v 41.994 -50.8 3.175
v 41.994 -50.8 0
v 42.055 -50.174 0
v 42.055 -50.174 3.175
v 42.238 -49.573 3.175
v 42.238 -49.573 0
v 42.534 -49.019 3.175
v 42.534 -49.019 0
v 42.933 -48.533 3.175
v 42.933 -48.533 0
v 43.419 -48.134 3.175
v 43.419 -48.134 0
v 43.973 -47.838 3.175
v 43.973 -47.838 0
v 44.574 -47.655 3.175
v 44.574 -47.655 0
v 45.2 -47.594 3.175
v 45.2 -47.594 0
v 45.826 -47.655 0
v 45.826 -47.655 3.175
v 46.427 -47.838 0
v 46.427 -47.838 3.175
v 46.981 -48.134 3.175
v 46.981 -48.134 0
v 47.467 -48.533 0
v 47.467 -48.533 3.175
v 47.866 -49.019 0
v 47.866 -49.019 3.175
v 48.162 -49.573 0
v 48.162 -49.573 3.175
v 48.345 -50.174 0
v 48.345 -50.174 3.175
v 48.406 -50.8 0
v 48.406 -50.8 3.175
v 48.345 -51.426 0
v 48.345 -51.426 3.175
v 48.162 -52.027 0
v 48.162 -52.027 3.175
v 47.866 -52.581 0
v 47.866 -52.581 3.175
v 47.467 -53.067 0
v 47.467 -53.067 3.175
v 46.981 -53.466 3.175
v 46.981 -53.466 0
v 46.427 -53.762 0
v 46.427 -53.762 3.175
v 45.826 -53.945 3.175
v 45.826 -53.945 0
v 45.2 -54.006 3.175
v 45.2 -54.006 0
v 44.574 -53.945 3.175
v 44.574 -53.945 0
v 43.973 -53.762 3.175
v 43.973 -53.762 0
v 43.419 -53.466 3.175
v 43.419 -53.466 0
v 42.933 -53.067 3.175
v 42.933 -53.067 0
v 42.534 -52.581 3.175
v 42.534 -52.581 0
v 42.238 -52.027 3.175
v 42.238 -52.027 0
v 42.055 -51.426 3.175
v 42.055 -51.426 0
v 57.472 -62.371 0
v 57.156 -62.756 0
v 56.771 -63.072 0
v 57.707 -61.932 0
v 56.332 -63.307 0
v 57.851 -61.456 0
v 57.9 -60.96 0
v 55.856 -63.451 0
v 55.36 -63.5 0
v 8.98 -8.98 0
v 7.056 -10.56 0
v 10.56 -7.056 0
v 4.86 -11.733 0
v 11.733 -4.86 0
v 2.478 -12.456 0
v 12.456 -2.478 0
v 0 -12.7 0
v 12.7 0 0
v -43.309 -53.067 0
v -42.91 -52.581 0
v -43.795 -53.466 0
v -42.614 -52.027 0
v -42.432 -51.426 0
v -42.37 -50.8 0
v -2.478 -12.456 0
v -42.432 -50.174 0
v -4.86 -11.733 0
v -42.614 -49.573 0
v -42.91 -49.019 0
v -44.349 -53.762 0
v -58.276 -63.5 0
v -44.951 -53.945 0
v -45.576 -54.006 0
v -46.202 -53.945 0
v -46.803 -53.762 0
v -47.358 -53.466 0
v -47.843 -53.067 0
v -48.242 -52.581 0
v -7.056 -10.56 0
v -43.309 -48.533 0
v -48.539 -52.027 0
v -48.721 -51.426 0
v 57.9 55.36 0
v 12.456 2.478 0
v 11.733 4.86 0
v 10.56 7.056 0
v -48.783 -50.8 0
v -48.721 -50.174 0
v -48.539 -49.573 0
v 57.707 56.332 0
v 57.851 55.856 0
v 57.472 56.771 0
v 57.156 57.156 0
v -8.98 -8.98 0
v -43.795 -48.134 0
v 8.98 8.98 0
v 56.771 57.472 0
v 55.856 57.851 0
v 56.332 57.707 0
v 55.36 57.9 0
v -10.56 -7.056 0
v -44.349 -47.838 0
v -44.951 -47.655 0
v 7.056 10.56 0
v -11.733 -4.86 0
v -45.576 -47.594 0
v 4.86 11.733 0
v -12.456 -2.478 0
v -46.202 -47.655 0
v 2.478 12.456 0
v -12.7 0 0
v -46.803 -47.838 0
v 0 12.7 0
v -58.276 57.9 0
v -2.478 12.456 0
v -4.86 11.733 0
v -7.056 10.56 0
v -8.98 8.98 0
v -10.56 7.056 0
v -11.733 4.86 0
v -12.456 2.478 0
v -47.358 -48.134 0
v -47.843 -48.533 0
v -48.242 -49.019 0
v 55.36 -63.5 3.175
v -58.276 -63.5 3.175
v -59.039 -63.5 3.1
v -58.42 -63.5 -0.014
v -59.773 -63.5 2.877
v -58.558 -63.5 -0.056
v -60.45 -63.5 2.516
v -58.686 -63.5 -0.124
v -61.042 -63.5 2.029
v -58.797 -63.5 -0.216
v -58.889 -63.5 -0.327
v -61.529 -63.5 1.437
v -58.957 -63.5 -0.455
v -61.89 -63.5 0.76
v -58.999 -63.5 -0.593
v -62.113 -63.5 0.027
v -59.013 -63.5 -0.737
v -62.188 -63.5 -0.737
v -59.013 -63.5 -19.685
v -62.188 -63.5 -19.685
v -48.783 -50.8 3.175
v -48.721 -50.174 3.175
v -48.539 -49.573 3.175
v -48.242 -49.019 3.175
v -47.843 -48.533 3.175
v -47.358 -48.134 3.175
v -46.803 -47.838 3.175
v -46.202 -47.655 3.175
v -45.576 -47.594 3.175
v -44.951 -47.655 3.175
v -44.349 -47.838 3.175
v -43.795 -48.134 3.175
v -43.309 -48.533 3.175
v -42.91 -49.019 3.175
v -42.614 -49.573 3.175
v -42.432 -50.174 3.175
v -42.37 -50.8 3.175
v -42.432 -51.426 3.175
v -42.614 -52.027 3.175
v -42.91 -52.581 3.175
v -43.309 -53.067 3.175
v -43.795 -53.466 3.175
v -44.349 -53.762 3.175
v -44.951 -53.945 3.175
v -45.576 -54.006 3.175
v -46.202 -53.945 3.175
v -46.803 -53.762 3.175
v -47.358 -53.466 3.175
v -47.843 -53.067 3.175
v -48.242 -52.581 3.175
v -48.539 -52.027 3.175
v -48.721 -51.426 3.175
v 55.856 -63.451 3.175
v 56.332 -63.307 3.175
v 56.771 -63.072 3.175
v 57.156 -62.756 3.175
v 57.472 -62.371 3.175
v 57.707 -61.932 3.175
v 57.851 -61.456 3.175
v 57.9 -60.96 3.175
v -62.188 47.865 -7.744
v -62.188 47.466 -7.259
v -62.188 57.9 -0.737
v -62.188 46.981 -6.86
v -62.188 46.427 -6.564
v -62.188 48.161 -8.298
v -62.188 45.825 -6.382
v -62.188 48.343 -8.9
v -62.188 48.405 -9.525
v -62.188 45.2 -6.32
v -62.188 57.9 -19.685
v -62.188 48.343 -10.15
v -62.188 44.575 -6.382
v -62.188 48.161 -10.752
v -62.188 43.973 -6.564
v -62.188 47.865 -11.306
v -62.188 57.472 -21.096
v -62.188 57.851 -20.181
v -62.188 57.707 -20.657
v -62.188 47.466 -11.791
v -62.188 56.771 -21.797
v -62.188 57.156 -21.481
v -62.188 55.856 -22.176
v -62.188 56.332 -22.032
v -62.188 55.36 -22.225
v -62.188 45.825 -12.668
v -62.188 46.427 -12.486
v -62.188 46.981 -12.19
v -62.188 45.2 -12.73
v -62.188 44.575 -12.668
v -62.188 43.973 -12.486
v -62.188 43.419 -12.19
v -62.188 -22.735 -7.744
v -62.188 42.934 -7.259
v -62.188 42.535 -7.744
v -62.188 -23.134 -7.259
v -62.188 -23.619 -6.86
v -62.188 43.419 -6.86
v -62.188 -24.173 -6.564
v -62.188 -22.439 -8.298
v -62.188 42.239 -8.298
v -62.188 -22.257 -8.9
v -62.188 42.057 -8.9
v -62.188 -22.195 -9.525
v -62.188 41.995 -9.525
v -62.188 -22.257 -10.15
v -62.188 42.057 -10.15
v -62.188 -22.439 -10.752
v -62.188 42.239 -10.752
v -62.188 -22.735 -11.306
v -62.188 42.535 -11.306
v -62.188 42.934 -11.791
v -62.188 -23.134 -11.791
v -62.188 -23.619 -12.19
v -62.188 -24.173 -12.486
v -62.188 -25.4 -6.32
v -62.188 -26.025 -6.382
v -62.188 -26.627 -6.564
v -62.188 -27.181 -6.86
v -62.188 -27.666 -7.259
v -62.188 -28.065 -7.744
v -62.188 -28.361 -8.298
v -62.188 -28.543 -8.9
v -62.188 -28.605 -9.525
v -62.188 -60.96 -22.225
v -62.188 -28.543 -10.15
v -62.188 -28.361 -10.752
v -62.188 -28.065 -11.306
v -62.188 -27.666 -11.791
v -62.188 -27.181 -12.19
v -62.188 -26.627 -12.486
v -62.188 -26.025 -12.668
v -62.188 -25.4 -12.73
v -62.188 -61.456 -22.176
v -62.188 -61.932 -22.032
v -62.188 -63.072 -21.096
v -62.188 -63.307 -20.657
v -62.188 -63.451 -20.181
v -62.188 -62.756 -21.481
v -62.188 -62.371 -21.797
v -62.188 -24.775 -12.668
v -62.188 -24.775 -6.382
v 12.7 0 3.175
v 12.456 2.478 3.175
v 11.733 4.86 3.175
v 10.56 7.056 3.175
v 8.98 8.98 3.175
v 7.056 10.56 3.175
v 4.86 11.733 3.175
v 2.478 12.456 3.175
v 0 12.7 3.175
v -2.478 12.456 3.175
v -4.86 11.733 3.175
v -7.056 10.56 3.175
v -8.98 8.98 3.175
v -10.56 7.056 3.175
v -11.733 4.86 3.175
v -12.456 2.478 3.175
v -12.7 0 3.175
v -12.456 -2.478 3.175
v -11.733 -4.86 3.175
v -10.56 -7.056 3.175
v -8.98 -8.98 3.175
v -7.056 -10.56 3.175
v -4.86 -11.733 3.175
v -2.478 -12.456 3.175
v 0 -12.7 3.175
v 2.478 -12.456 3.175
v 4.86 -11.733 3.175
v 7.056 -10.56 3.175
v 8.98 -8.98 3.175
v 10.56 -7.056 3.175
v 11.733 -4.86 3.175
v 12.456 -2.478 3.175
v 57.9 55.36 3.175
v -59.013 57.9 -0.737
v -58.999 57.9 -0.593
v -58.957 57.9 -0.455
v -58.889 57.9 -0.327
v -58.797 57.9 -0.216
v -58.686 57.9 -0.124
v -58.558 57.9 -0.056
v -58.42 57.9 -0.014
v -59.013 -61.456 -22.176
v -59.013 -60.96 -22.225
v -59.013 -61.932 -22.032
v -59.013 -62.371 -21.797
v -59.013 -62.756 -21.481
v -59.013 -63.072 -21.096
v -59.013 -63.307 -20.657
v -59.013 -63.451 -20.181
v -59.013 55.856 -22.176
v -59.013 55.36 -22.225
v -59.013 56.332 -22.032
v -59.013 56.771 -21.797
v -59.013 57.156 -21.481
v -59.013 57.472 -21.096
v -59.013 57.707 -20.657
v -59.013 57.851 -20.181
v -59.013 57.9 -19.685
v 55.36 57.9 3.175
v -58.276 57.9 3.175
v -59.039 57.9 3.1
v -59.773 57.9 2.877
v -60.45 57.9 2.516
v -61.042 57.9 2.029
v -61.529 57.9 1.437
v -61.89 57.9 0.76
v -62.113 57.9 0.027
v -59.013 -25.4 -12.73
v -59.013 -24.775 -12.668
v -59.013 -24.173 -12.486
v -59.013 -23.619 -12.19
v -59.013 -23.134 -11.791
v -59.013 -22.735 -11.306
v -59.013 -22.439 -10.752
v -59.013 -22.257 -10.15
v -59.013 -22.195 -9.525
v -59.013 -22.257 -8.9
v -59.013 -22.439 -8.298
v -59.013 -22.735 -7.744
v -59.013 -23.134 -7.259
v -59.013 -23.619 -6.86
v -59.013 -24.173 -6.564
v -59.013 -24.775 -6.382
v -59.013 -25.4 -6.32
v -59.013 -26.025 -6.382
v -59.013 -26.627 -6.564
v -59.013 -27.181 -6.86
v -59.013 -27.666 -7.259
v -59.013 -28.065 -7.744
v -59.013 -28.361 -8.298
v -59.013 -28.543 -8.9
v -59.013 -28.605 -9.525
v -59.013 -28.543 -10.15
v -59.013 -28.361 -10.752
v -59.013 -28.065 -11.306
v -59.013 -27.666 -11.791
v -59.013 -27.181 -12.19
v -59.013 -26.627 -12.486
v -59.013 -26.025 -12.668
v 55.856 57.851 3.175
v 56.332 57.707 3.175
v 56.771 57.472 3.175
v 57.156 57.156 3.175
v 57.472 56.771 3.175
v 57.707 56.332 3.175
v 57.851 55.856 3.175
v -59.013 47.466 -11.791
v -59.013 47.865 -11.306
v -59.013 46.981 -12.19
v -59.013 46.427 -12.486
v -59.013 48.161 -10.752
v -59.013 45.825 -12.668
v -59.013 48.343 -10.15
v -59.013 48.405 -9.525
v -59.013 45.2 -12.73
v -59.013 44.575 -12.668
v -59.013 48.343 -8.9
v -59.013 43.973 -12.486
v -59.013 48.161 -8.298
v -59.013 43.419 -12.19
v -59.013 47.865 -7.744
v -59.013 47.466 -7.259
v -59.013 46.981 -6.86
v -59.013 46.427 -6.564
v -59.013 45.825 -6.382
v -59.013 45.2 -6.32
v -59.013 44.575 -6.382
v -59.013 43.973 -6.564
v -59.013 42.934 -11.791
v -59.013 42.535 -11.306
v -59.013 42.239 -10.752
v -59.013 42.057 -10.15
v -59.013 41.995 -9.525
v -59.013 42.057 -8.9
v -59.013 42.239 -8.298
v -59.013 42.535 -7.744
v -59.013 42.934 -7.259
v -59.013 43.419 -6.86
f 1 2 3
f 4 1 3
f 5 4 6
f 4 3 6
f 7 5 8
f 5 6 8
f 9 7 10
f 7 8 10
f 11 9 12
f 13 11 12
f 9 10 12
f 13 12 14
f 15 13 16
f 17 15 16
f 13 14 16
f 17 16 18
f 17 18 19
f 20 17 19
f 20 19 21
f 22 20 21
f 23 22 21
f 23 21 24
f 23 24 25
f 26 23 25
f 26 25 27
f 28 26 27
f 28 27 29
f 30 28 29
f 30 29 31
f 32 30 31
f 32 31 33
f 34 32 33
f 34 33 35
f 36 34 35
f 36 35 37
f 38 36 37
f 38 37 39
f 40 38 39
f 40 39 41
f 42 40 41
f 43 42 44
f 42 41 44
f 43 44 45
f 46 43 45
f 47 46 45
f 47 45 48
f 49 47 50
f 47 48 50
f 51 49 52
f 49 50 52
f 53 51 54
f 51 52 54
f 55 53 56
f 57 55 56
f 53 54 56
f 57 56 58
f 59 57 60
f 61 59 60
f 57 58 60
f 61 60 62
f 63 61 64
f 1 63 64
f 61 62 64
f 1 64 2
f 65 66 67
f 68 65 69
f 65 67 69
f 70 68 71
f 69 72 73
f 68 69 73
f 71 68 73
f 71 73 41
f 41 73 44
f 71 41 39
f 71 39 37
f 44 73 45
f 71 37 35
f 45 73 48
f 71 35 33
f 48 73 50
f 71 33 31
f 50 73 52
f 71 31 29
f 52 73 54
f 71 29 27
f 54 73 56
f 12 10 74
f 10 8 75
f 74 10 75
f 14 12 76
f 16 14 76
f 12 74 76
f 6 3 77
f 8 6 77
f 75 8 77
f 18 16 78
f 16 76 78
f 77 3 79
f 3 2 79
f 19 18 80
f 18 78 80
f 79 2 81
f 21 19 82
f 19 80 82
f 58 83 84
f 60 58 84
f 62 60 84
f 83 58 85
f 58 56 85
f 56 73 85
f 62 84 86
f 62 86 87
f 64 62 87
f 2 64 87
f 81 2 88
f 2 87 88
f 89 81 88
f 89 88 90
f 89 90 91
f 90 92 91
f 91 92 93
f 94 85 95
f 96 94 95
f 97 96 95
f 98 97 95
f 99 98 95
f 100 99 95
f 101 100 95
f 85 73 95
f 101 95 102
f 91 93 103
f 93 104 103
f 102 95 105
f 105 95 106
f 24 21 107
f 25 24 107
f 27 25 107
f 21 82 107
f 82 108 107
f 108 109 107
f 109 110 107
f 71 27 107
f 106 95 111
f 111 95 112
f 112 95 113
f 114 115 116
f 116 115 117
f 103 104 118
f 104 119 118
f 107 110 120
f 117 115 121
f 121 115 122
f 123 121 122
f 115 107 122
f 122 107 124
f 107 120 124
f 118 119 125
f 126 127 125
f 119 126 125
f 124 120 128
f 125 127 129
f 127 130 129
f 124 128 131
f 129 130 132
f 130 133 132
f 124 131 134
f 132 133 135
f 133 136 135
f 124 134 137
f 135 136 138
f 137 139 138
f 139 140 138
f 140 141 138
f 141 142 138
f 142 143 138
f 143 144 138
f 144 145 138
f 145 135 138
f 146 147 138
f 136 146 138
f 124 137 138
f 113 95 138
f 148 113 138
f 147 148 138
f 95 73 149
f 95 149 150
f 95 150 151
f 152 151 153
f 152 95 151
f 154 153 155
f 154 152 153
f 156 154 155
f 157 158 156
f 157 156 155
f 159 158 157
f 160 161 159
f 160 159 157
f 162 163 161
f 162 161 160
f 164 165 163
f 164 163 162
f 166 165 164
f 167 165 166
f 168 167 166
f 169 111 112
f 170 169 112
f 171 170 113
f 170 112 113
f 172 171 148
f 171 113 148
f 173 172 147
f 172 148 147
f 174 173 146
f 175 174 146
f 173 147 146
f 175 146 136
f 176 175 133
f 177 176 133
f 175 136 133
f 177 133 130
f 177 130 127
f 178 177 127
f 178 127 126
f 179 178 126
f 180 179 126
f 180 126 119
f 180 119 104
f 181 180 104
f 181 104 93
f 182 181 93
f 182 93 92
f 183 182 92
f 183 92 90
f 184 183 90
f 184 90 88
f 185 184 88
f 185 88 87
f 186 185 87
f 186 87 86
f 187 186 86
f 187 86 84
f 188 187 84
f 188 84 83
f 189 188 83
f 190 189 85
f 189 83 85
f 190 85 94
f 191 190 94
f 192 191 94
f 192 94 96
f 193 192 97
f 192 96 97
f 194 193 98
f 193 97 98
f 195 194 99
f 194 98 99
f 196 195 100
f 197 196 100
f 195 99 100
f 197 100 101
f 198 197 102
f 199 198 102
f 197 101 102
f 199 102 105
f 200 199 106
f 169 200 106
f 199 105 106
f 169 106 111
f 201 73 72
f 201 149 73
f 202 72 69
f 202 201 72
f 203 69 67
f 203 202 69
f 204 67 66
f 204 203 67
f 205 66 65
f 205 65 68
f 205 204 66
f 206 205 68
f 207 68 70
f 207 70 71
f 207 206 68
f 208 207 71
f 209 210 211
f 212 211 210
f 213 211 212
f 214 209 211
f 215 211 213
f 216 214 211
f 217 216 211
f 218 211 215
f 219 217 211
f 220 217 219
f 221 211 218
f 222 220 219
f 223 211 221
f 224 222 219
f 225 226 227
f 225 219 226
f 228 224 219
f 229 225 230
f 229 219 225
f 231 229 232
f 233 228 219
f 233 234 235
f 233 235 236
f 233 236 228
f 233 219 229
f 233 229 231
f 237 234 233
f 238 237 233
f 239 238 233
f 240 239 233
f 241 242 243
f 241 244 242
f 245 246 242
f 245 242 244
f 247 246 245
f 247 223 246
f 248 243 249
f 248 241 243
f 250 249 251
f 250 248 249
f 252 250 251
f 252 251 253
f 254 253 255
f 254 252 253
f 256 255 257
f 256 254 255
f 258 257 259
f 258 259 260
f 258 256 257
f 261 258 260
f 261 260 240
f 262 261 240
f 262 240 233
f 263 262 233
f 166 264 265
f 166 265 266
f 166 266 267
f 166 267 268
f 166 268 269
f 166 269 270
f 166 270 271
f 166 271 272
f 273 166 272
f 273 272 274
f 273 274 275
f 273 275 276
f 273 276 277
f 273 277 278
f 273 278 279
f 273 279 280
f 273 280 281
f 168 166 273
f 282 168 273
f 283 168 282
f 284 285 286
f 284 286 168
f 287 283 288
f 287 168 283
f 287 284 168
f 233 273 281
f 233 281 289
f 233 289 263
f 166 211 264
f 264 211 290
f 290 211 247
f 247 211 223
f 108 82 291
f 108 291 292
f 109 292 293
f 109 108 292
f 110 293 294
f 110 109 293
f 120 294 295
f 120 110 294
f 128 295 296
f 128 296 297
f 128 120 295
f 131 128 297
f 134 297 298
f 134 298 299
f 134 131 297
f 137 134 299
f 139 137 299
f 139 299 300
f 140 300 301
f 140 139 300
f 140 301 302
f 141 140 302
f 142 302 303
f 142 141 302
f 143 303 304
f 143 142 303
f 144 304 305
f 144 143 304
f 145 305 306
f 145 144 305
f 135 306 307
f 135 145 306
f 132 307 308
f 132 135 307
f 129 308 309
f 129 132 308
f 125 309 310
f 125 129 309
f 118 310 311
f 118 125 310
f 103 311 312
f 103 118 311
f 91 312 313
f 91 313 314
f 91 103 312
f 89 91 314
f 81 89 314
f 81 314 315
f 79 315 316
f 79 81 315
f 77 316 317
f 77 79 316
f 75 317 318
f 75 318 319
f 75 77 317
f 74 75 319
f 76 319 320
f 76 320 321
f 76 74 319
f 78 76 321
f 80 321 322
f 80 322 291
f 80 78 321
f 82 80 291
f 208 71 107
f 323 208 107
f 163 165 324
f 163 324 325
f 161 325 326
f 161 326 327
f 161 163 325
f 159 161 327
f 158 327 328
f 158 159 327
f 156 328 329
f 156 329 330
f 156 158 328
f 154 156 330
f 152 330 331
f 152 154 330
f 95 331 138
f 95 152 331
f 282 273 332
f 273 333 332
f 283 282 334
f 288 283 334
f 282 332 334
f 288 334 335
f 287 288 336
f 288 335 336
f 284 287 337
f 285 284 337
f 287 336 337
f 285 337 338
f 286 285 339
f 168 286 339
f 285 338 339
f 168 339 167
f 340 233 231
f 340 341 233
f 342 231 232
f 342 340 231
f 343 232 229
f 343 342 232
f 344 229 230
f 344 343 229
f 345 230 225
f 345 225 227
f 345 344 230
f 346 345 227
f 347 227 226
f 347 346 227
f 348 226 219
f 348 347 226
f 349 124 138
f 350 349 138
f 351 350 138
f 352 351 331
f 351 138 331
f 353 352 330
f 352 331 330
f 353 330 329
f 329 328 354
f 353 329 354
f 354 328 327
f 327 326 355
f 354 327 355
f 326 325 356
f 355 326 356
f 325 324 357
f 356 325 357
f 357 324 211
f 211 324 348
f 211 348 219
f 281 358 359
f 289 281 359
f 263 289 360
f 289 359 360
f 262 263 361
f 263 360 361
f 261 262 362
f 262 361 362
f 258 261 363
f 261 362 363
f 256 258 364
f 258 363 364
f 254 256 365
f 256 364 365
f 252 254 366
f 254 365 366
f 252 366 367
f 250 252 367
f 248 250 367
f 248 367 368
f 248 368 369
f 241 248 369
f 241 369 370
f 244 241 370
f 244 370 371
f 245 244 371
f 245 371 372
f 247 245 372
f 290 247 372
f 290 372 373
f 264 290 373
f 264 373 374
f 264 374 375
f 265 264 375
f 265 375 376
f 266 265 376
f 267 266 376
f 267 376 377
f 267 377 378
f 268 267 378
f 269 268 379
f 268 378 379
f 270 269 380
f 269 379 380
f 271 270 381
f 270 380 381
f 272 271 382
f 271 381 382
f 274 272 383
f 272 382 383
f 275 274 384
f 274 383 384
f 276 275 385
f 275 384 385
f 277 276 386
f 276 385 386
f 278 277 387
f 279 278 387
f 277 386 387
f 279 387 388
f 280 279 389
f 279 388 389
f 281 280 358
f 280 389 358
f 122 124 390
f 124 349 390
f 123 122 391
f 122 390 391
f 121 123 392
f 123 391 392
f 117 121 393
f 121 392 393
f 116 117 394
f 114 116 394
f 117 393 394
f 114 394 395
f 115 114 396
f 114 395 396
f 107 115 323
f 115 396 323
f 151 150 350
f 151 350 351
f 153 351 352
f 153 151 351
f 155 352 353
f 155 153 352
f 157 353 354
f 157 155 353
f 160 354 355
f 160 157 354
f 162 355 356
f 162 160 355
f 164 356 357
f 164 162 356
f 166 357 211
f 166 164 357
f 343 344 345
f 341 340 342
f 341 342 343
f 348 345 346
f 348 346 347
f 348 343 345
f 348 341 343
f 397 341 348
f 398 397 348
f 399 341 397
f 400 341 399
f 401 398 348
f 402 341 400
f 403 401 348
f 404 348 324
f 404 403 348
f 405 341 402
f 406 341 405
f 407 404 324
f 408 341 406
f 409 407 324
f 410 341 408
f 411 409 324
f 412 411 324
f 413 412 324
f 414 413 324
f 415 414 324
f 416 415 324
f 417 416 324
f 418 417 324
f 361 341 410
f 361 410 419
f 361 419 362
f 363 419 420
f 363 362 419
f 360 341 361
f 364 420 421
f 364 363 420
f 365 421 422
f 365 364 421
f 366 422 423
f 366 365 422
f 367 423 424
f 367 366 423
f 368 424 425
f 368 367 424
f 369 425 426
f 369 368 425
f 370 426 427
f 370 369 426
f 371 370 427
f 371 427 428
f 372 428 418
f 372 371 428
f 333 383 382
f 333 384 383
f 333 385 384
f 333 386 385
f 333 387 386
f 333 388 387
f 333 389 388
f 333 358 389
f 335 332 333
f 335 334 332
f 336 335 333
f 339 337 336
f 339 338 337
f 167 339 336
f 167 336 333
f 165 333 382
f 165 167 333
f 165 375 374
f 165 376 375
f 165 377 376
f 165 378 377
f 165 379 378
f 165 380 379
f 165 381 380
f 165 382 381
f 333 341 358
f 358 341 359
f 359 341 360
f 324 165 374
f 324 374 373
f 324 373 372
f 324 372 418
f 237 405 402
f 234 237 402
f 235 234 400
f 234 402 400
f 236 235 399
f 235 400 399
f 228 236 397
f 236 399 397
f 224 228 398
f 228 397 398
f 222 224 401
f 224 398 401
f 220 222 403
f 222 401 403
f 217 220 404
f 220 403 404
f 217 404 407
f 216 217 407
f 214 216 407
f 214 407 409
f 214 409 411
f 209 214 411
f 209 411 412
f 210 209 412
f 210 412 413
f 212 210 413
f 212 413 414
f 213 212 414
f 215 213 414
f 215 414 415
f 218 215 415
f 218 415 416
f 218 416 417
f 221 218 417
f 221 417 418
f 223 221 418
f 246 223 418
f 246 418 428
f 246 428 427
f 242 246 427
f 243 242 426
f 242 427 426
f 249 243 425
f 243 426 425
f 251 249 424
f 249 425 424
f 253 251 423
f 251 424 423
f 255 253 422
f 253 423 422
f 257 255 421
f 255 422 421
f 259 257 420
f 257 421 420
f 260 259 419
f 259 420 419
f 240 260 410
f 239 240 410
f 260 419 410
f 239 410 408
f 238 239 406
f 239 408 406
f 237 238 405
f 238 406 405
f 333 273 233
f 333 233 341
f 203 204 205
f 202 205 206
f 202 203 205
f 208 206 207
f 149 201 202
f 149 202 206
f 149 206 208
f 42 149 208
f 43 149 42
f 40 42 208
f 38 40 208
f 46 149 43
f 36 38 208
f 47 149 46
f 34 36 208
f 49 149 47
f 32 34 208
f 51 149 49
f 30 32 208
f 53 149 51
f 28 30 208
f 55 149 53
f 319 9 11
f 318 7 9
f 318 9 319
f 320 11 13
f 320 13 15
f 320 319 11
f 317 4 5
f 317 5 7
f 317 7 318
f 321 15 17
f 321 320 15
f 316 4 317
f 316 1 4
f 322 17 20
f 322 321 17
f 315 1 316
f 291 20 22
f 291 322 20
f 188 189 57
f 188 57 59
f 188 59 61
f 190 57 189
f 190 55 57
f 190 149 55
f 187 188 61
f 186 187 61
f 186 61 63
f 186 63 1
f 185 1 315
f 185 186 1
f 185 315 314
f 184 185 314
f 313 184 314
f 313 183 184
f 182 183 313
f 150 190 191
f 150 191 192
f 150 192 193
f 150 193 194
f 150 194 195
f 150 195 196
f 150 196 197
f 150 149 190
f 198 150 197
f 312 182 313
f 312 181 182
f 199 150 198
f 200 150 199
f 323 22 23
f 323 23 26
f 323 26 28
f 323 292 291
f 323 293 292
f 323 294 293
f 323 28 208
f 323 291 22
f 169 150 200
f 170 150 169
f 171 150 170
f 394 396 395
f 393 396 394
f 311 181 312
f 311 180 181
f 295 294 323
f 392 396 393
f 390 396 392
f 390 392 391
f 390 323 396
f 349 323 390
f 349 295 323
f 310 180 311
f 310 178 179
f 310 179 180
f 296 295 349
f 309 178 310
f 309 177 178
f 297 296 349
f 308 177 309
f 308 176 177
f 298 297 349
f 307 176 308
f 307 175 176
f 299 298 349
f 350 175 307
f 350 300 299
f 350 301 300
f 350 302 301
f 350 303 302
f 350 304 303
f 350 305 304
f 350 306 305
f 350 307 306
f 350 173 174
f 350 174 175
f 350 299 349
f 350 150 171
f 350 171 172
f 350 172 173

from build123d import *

# Parameters (mm, degrees)
SKETCH1_W                    = 121.4
SKETCH1_H                    = 120.087935058
SKETCH1_R                    = 12.7
BASE_FLANGE1_DEPTH           = 3.175
EDGE_FLANGE1_STRIP_W         = 14.1732
EDGE_FLANGE1_STRIP_H         = 3.175
EDGE_FLANGE1_STRIP_CUT_DEPTH = 121.4
EDGE_FLANGE1_DEPTH           = 121.4
FILLET1_R                    = 2.54
SKETCH9_R                    = 3.205
LOWER_T_SLOT_HOLES_DEPTH     = 135.888231543
SKETCH10_R                   = 3.206253706
UPPER_T_SLOT_HOLES_DEPTH     = 92.616264341


# Sheet-metal steps are written as plain solids
with BuildPart() as part:
    # Sketch1 → Base-Flange1 (new body)
    with BuildSketch(Plane(origin=(0, 0, 0), x_dir=(0, 1, 0), z_dir=(0, 0, 1))):
        with Locations((-2.8, 2.143967529)):
            Rectangle(SKETCH1_W, SKETCH1_H)
        with Locations(Location((0, 0, 0), (0, 0, 270))):
            Circle(SKETCH1_R, mode=Mode.SUBTRACT)
    extrude(amount=BASE_FLANGE1_DEPTH)

    # Edge-Flange1 strip (across the edge) → Edge-Flange1 strip cut (cut)
    with BuildSketch(Plane(origin=(-62.187935058, -63.5, 0), x_dir=(1, 0, 0), z_dir=(0, 1, 0))):
        with Locations((-3.175, -1.5875)):
            Rectangle(EDGE_FLANGE1_STRIP_W, EDGE_FLANGE1_STRIP_H)
    extrude(amount=EDGE_FLANGE1_STRIP_CUT_DEPTH, mode=Mode.SUBTRACT)

    # Edge-Flange1 section (across the edge) → Edge-Flange1 (add)
    with BuildSketch(Plane(origin=(-62.187935058, -63.5, 0), x_dir=(1, 0, 0), z_dir=(0, 1, 0))):
        with BuildLine():
            Line((0, 0.7366), (0, 22.225))
            Line((0, 22.225), (3.175, 22.225))
            Line((3.175, 22.225), (3.175, 0.7366))
            ThreePointArc((3.175, 0.7366), (3.390745145, 0.215745145), (3.9116, 0))
            Line((3.9116, 0), (3.9116, -3.175))
            ThreePointArc((3.9116, -3.175), (1.145681115, -2.029318885), (0, 0.7366))
        make_face()
    extrude(amount=EDGE_FLANGE1_DEPTH)

    # Fillet1
    fillet1_edges = [part.edges().sort_by_distance(p)[0] for p in [
        (-60.600435058, -63.5, -22.225),
        (-60.600435058, 57.9, -22.225),
        (57.9, 57.9, 1.5875),
        (57.9, -63.5, 1.5875),
    ]]
    fillet(fillet1_edges, radius=FILLET1_R)

    # Sketch9 → Lower T-Slot Holes (cut, through all)
    with BuildSketch(Plane.YZ.offset(-59.012935058)):
        with Locations(Location((45.2, -9.525, 0), (0, 0, 270))):
            Circle(SKETCH9_R)
        with Locations(Location((-25.4, -9.525, 0), (0, 0, 270))):
            Circle(SKETCH9_R)
    extrude(amount=-LOWER_T_SLOT_HOLES_DEPTH, mode=Mode.SUBTRACT)

    # Sketch10 → Upper T-Slot Holes (cut, through all)
    with BuildSketch(Plane(origin=(0, 0, 0), x_dir=(1, 0, 0), z_dir=(0, 0, -1))):
        with Locations(Location((-45.576335058, 50.8, 0), (0, 0, 180))):
            Circle(SKETCH10_R)
        with Locations(Location((45.2, 50.8, 0), (0, 0, 180))):
            Circle(SKETCH10_R)
    extrude(amount=-UPPER_T_SLOT_HOLES_DEPTH, mode=Mode.SUBTRACT)


solid = part.part
